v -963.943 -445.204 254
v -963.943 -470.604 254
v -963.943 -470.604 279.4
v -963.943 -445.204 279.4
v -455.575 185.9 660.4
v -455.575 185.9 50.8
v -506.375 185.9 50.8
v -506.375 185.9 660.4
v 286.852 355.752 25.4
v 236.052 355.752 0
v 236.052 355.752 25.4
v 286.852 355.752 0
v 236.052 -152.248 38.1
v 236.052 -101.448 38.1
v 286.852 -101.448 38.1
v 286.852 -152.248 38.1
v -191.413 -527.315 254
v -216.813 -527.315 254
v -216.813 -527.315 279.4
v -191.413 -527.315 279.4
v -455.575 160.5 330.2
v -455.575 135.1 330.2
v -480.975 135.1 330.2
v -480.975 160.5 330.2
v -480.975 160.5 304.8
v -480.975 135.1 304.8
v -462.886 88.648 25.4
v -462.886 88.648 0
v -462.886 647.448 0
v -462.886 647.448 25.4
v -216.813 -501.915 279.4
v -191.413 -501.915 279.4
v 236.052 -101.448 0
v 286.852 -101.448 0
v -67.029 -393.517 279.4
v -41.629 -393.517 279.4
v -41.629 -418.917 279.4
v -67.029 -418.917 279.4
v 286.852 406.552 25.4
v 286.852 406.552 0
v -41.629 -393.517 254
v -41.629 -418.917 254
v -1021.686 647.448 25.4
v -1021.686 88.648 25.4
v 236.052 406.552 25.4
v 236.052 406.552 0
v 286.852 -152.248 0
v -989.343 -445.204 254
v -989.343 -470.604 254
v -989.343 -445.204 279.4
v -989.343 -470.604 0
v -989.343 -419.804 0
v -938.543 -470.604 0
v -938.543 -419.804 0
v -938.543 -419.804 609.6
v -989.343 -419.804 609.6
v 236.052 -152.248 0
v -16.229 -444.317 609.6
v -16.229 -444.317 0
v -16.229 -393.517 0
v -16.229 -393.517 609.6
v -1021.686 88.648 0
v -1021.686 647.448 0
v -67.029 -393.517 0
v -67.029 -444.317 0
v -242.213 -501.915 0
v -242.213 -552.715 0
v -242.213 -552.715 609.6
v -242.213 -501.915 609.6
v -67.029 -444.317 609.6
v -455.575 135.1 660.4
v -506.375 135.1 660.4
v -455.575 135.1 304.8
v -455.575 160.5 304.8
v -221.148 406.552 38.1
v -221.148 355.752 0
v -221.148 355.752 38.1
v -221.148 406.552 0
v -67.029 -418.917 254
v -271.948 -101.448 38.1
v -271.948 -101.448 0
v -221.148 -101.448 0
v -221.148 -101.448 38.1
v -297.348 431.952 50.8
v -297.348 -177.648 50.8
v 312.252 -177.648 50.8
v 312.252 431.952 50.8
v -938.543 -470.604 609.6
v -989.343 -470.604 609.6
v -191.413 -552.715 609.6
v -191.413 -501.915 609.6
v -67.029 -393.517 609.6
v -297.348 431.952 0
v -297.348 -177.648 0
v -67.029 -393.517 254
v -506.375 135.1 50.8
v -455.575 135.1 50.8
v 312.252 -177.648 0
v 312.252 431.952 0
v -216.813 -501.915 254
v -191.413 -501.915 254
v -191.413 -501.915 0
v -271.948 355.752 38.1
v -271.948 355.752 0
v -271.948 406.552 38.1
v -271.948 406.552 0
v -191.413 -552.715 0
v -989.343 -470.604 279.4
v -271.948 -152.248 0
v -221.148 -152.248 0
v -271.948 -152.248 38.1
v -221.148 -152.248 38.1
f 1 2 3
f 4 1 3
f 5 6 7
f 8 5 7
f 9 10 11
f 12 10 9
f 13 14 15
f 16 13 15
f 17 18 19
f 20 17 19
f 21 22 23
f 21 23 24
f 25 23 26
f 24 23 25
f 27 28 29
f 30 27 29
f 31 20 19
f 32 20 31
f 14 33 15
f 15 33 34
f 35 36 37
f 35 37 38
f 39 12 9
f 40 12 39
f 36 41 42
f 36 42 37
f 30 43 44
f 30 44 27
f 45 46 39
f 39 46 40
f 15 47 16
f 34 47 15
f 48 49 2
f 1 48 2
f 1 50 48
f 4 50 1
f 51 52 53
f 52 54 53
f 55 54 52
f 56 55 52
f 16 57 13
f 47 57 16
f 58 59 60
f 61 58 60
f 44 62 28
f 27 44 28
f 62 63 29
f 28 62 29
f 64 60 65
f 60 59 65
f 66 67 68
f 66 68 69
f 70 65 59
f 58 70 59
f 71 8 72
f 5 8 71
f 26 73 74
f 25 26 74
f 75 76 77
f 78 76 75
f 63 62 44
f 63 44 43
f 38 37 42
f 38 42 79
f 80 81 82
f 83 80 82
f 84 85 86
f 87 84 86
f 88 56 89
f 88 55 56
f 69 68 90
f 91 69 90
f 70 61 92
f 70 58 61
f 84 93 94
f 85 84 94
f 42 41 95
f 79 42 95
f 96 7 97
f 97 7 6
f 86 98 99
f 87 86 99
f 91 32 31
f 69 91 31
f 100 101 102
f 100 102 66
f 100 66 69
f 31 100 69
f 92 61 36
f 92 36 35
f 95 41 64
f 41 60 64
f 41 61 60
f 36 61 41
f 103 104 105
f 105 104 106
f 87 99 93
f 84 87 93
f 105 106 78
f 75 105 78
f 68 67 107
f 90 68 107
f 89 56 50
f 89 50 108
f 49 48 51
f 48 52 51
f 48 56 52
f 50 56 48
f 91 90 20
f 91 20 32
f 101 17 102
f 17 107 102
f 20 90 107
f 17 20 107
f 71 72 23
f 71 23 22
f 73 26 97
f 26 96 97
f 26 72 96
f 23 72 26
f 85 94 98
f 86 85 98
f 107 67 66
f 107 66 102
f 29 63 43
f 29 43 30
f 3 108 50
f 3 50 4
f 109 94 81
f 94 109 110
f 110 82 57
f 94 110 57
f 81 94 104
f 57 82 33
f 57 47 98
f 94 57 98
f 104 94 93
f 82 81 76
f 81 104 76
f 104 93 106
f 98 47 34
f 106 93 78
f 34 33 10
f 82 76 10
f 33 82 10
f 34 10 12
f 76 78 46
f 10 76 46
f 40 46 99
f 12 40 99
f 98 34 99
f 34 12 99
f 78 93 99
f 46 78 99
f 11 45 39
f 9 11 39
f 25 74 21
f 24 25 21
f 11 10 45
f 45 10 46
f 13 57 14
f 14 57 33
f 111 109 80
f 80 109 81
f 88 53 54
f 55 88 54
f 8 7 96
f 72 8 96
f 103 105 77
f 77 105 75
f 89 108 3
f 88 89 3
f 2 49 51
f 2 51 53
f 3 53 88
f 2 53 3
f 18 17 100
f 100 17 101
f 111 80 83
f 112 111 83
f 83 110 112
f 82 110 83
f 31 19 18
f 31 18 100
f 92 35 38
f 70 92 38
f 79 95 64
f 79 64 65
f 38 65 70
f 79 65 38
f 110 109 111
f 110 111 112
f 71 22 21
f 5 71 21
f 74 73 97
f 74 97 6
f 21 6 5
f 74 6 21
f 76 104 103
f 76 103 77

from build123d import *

# Parameters (mm, degrees)
F0_W      = 25.4
F0_H      = 25.4
F0_W_2    = 50.8
F0_W_3    = 457.2
F0_H_2    = 50.8
F0_H_3    = 457.2
F1_DEPTH  = 50.8
F2_DEPTH  = 38.1
F3_DEPTH  = 38.1
F4_DEPTH  = 38.1
F5_DEPTH  = 38.1
F6_W      = 25.4
F6_H      = 25.4
F7_DEPTH  = 609.6
F8_W      = 25.4
F8_H      = 25.4
F9_DEPTH  = 609.6
F10_DEPTH = 609.6
F11_W     = 25.4
F11_H     = 25.4
F12_DEPTH = 609.6
F13_W     = 25.4
F13_H     = 25.4
F14_DEPTH = 609.6
F15_DEPTH = 609.6
F16_W     = 558.8
F16_H     = 558.8
F17_DEPTH = 25.4
F18_W     = 25.4
F18_H     = 25.4
F19_DEPTH = 25.4
F21_W     = 25.4
F21_H     = 25.4
F22_DEPTH = 25.4
F24_W     = 25.4
F24_H     = 25.4
F25_DEPTH = 25.4
F27_W     = 25.4
F27_H     = 25.4
F28_DEPTH = 25.4
F29_ANGLE = 45
F30_DEPTH = 25.4
F31_DEPTH = 25.4
F32_ANGLE = 90
F33_ANGLE = 135


with BuildPart() as f1:
    # F0 (on Top) → F1 (new body)
    with BuildSketch(Plane.XY):
        with Locations((-284.6480894744, 419.2517064326)):
            Rectangle(F0_W, F0_H)
        with Locations((299.5519105256, 419.2517064326)):
            Rectangle(F0_W, F0_H)
        with Locations((-284.6480894744, -164.9482935674)):
            Rectangle(F0_W, F0_H)
        with Locations((299.5519105256, -164.9482935674)):
            Rectangle(F0_W, F0_H)
        with Locations((-246.5480894744, 419.2517064326)):
            Rectangle(F0_W_2, F0_H)
        with Locations((7.4519105256, 419.2517064326)):
            Rectangle(F0_W_3, F0_H)
        with Locations((261.4519105256, 419.2517064326)):
            Rectangle(F0_W_2, F0_H)
        with Locations((-246.5480894744, -164.9482935674)):
            Rectangle(F0_W_2, F0_H)
        with Locations((7.4519105256, -164.9482935674)):
            Rectangle(F0_W_3, F0_H)
        with Locations((261.4519105256, -164.9482935674)):
            Rectangle(F0_W_2, F0_H)
        with Locations((-284.6480894744, 381.1517064326)):
            Rectangle(F0_W, F0_H_2)
        with Locations((-284.6480894744, 127.1517064326)):
            Rectangle(F0_W, F0_H_3)
        with Locations((-284.6480894744, -126.8482935674)):
            Rectangle(F0_W, F0_H_2)
        with Locations((299.5519105256, 381.1517064326)):
            Rectangle(F0_W, F0_H_2)
        with Locations((299.5519105256, 127.1517064326)):
            Rectangle(F0_W, F0_H_3)
        with Locations((299.5519105256, -126.8482935674)):
            Rectangle(F0_W, F0_H_2)
        with Locations((-246.5480894744, 127.1517064326)):
            Rectangle(F0_W_2, F0_H_3)
        with Locations((7.4519105256, 381.1517064326)):
            Rectangle(F0_W_3, F0_H_2)
        with Locations((261.4519105256, 127.1517064326)):
            Rectangle(F0_W_2, F0_H_3)
        with Locations((-246.5480894744, 381.1517064326)):
            Rectangle(F0_W_2, F0_H_2)
        with Locations((-246.5480894744, -126.8482935674)):
            Rectangle(F0_W_2, F0_H_2)
        with Locations((7.4519105256, 127.1517064326)):
            Rectangle(F0_W_3, F0_H_3)
        with Locations((7.4519105256, -126.8482935674)):
            Rectangle(F0_W_3, F0_H_2)
        with Locations((261.4519105256, -126.8482935674)):
            Rectangle(F0_W_2, F0_H_2)
        with Locations((261.4519105256, 381.1517064326)):
            Rectangle(F0_W_2, F0_H_2)
    extrude(amount=F1_DEPTH)

    # F0 (on Top) → F2 (cut)
    with BuildSketch(Plane.XY):
        with Locations((-246.5480894744, -126.8482935674)):
            Rectangle(F0_W_2, F0_H_2)
    extrude(amount=-F2_DEPTH, mode=Mode.SUBTRACT)

    # F0 (on Top) → F3 (cut)
    with BuildSketch(Plane.XY):
        with Locations((-246.5480894744, -126.8482935674)):
            Rectangle(F0_W_2, F0_H_2)
    extrude(amount=F3_DEPTH, mode=Mode.SUBTRACT)

    # F0 (on Top) → F4 (cut)
    with BuildSketch(Plane.XY):
        with Locations((261.4519105256, -126.8482935674)):
            Rectangle(F0_W_2, F0_H_2)
    extrude(amount=F4_DEPTH, mode=Mode.SUBTRACT)

    # F0 (on Top) → F5 (cut)
    with BuildSketch(Plane.XY):
        with Locations((-246.5480894744, 381.1517064326)):
            Rectangle(F0_W_2, F0_H_2)
    extrude(amount=F5_DEPTH, mode=Mode.SUBTRACT)

    # F0 (on Top) → F30 (join)
    with BuildSketch(Plane.XY):
        with Locations((261.4519105256, 381.1517064326)):
            Rectangle(F0_W_2, F0_H_2)
    extrude(amount=F30_DEPTH)

    # F0 (on Top) → F31 (cut)
    with BuildSketch(Plane.XY):
        with Locations((261.4519105256, 381.1517064326)):
            Rectangle(F0_W_2, F0_H_2)
    extrude(amount=F31_DEPTH, mode=Mode.SUBTRACT)


with BuildPart() as f7:
    # F6 (on face) → F7 (new body)
    with BuildSketch(Plane.XY.offset(50.8)):
        with Locations((-493.6751659632, 173.1995851017)):
            Rectangle(F6_W, F6_H)
        with Locations((-468.2751659632, 173.1995851017)):
            Rectangle(F6_W, F6_H)
        with Locations((-493.6751659632, 147.7995851017)):
            Rectangle(F6_W, F6_H)
        with Locations((-468.2751659632, 147.7995851017)):
            Rectangle(F6_W, F6_H)
    extrude(amount=F7_DEPTH)

    # F27 (on offset) → F28 (cut)
    with BuildSketch(Plane.YZ.offset(-455.5751659632)):
        with Locations((147.7995851017, 317.5)):
            Rectangle(F27_W, F27_H)
    extrude(amount=-F28_DEPTH, mode=Mode.SUBTRACT)


with BuildPart() as f9:
    # F8 (on Top) → F9 (new body)
    with BuildSketch(Plane.XY):
        with Locations((-229.513236475, -514.6153616277)):
            Rectangle(F8_W, F8_H)
        with Locations((-204.113236475, -514.6153616277)):
            Rectangle(F8_W, F8_H)
    extrude(amount=F9_DEPTH)

    # F8 (on Top) → F10 (join)
    with BuildSketch(Plane.XY):
        with Locations((-229.513236475, -514.6153616277)):
            Rectangle(F8_W, F8_H)
        with Locations((-204.113236475, -514.6153616277)):
            Rectangle(F8_W, F8_H)
        with Locations((-229.513236475, -540.0153616277)):
            Rectangle(F8_W, F8_H)
        with Locations((-204.113236475, -540.0153616277)):
            Rectangle(F8_W, F8_H)
    extrude(amount=F10_DEPTH)

    # F21 (on offset) → F22 (cut)
    with BuildSketch(Plane.YZ.offset(-191.413236475)):
        with Locations((-514.6153616277, 266.7)):
            Rectangle(F21_W, F21_H)
    extrude(amount=-F22_DEPTH, mode=Mode.SUBTRACT)


with BuildPart() as f12:
    # F11 (on Top) → F12 (new body)
    with BuildSketch(Plane.XY):
        with Locations((-976.6431536198, -508.7043218727)):
            Rectangle(F11_W, F11_H)
        with Locations((-951.2431536198, -508.7043218727)):
            Rectangle(F11_W, F11_H)
        with Locations((-976.6431536198, -483.3043218727)):
            Rectangle(F11_W, F11_H)
        with Locations((-951.2431536198, -483.3043218727)):
            Rectangle(F11_W, F11_H)
    extrude(amount=F12_DEPTH)

    # F18 (on face) → F19 (cut)
    with BuildSketch(Plane.YZ.offset(-938.5431536198)):
        with Locations((-508.7043218727, 266.7)):
            Rectangle(F18_W, F18_H)
    extrude(amount=-F19_DEPTH, mode=Mode.SUBTRACT)


with BuildPart() as f14:
    # F13 (on Top) → F14 (new body)
    with BuildSketch(Plane.XY):
        with Locations((-18.407859993, -391.3383118198)):
            Rectangle(F13_W, F13_H)
        with Locations((6.992140007, -391.3383118198)):
            Rectangle(F13_W, F13_H)
        with Locations((-18.407859993, -416.7383118198)):
            Rectangle(F13_W, F13_H)
        with Locations((6.992140007, -416.7383118198)):
            Rectangle(F13_W, F13_H)
    extrude(amount=F14_DEPTH)

    # F13 (on Top) → F15 (join)
    with BuildSketch(Plane.XY):
        with Locations((-18.407859993, -416.7383118198)):
            Rectangle(F13_W, F13_H)
    extrude(amount=F15_DEPTH)

    # F24 (on offset) → F25 (cut)
    with BuildSketch(Plane.XZ.offset(429.4383118198)):
        with Locations((6.992140007, 266.7)):
            Rectangle(F24_W, F24_H)
    extrude(amount=-F25_DEPTH, mode=Mode.SUBTRACT)


with BuildPart() as f17:
    # F16 (on Top) → F17 (new body)
    with BuildSketch(Plane.XY):
        with Locations((-742.2856390476, 368.0477765703)):
            Rectangle(F16_W, F16_H)
    extrude(amount=F17_DEPTH)


with BuildPart() as f14_1:
    # F29: moved
    add(f14.part.rotate(Axis((19.692140007, -429.4383118198, 127), (0, 0, -1)), F29_ANGLE))


with BuildPart() as f12_1:
    # F32: moved
    add(f12.part.rotate(Axis((-938.5431536198, -470.6043218727, 304.8), (0, 0, -1)), F32_ANGLE))


with BuildPart() as f14_2:
    # F33: moved
    add(f14_1.part.rotate(Axis((-16.2288844773, -393.5172873355, 304.8), (0, 0, -1)), F33_ANGLE))


solid = Compound([f1.part, f7.part, f9.part, f17.part, f12_1.part, f14_2.part])
